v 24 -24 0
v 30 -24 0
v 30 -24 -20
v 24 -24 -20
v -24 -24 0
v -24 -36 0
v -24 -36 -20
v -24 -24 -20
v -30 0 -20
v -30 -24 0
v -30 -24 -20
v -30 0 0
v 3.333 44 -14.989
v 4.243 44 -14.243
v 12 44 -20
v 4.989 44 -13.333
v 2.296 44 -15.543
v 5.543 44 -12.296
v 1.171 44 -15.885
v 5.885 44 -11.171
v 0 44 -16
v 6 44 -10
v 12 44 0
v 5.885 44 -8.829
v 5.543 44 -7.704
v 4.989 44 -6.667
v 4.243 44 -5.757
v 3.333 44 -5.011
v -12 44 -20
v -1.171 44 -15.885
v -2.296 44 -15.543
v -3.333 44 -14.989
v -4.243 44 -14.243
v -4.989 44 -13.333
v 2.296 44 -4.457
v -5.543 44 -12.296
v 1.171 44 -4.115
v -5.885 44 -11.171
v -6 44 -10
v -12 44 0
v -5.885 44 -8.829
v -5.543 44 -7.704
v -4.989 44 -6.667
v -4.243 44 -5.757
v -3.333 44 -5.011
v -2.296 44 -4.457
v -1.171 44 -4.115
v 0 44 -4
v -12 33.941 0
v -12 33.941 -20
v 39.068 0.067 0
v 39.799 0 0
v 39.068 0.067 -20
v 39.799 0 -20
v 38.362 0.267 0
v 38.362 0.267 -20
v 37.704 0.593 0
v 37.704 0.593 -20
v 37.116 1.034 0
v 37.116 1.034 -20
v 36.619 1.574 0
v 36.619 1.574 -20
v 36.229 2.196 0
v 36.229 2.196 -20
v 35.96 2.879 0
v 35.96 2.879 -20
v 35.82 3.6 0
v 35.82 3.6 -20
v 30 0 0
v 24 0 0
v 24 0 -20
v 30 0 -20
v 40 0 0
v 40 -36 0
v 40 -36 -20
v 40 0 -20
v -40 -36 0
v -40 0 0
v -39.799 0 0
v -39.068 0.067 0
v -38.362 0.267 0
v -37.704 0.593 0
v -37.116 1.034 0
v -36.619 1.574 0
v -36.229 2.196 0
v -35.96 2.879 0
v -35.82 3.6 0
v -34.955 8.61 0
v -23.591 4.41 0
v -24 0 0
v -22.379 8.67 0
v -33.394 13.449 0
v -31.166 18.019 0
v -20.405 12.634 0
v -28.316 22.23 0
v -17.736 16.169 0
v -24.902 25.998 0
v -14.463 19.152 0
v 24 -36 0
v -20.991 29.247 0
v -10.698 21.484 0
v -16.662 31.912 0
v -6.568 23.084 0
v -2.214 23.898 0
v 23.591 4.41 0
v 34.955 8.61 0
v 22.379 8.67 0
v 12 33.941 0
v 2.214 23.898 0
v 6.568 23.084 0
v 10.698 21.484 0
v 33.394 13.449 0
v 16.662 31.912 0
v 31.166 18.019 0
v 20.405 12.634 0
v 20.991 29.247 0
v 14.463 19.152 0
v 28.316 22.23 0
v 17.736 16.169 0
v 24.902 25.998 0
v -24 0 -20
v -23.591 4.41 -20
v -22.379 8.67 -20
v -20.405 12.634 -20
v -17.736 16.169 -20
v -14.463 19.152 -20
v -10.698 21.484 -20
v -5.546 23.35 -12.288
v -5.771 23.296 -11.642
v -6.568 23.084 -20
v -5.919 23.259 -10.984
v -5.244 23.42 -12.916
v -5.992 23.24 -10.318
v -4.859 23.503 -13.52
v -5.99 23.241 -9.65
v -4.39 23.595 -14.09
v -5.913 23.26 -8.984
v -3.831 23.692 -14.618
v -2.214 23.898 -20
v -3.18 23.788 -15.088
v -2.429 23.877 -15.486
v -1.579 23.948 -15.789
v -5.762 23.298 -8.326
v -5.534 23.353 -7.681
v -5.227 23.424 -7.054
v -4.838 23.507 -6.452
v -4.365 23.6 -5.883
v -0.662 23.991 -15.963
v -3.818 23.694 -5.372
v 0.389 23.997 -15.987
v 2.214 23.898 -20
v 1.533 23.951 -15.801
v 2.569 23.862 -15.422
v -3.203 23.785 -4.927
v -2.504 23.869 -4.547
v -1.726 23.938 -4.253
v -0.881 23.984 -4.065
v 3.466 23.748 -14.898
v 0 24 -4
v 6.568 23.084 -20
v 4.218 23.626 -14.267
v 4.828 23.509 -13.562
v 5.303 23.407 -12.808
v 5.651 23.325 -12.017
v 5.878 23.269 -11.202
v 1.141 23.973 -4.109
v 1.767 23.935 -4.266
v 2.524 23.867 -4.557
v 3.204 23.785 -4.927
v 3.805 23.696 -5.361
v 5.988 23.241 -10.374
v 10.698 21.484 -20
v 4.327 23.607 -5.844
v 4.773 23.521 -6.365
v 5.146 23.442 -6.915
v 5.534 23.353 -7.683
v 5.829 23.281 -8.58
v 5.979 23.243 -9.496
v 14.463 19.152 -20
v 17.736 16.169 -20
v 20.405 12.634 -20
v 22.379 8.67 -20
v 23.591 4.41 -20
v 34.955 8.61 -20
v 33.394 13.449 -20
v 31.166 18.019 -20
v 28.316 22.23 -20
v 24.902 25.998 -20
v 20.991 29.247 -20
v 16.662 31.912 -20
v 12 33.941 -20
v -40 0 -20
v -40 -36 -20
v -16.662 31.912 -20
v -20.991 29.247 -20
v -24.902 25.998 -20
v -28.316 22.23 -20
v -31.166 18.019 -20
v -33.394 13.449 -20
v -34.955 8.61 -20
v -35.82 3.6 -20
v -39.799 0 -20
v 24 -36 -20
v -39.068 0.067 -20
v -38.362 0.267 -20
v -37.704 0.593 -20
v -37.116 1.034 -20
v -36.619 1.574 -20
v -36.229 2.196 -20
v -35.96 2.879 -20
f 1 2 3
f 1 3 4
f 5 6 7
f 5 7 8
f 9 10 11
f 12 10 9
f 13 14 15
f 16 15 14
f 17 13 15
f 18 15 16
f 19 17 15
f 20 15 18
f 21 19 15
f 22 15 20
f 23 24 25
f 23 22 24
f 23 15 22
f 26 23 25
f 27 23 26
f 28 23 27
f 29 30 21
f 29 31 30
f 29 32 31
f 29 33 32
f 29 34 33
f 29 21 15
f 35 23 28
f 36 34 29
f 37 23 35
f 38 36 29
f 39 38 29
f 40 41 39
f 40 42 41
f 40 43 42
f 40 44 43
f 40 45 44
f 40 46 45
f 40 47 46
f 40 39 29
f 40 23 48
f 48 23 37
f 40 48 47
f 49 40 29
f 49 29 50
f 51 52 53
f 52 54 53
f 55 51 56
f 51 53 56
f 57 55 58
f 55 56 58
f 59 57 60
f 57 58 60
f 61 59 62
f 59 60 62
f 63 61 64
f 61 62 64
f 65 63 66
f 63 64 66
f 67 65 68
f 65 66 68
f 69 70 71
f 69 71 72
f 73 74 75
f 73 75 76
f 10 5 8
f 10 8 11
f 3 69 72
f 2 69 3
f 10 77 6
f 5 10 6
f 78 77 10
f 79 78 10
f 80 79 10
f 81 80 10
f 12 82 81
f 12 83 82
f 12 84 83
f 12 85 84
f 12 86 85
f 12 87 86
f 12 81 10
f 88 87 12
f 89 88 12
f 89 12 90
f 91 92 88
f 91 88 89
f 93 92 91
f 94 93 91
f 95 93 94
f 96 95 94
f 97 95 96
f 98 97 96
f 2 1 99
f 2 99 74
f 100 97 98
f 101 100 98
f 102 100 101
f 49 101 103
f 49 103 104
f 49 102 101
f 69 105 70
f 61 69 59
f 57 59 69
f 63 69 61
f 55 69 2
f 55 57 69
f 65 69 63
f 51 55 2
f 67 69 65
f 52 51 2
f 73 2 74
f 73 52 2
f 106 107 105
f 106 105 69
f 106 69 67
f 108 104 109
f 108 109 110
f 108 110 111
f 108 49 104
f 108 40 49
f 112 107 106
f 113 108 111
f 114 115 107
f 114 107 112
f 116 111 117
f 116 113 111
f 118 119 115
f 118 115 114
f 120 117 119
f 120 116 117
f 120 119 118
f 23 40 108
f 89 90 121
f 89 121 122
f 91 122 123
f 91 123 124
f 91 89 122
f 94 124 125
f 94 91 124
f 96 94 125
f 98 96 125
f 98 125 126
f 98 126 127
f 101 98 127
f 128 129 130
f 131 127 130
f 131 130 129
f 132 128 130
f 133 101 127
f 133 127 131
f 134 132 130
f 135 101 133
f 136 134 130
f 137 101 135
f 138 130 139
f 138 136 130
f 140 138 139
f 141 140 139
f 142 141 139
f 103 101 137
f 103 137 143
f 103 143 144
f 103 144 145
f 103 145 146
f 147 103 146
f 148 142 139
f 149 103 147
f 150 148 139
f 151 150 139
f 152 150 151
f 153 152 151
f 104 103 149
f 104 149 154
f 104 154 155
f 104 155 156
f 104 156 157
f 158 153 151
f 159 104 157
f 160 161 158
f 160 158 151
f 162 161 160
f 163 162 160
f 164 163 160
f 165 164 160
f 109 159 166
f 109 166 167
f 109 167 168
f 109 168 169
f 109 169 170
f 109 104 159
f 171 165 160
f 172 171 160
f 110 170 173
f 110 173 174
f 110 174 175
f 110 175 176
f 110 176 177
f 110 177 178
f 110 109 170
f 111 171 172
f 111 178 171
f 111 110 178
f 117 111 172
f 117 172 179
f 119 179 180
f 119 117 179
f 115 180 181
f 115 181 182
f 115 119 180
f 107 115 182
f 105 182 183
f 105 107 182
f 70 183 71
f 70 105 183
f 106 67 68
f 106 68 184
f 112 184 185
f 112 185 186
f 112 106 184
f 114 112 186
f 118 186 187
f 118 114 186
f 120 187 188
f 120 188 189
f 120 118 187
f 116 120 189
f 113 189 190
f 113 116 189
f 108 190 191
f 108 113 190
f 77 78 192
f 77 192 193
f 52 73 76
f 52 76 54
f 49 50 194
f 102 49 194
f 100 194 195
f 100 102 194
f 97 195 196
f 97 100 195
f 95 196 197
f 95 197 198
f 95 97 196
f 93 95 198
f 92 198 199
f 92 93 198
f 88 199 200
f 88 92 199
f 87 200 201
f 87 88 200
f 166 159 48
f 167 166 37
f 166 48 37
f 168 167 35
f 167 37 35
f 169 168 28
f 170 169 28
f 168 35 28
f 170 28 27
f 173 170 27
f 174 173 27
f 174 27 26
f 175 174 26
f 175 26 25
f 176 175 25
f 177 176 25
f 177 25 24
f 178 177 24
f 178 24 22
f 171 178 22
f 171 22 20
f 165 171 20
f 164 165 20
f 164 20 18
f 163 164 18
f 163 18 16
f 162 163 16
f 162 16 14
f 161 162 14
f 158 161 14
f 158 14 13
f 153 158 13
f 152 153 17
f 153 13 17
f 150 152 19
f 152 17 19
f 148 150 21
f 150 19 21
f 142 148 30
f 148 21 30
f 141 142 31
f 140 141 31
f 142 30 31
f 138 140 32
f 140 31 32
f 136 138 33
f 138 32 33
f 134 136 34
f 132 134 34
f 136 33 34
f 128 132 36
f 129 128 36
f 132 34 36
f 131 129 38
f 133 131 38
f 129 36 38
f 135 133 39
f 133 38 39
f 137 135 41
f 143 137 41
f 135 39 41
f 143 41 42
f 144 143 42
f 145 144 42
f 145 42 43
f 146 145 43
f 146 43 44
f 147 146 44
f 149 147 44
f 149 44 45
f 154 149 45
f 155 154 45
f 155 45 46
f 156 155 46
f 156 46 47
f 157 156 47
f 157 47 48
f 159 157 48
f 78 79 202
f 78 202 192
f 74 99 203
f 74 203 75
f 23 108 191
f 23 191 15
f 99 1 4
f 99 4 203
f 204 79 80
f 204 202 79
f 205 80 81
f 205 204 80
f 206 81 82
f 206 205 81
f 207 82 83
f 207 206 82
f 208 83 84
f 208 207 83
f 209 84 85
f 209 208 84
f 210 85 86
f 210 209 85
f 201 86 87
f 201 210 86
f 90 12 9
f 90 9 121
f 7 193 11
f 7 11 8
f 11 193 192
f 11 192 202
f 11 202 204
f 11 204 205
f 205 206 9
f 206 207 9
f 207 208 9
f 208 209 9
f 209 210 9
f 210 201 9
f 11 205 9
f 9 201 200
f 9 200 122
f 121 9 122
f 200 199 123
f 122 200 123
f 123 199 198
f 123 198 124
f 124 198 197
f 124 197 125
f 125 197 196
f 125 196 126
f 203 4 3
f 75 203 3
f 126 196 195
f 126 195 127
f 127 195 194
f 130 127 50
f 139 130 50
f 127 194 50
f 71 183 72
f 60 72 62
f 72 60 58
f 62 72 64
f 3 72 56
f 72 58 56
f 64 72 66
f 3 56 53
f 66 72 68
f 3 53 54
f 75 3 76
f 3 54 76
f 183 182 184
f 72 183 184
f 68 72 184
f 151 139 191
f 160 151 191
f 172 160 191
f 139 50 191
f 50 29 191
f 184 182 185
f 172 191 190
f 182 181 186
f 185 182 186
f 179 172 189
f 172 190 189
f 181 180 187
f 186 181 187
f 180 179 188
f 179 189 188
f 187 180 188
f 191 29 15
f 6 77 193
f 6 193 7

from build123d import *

# Parameters (mm, degrees)
BOSS_EXTRUDE1_DEPTH = 20
FILLET1_R           = 4
SKETCH3_R           = 6
CUT_EXTRUDE2_DEPTH  = 92.651513899


with BuildPart() as part:
    # Sketch2 → Boss-Extrude1 (new body)
    with BuildSketch(Plane.XY):
        with BuildLine():
            Line((-36, 0), (-40, 0))
            Line((-40, 0), (-40, -36))
            Line((-40, -36), (-24, -36))
            Line((-24, -36), (-24, -24))
            Line((-24, -24), (-30, -24))
            Line((-30, -24), (-30, 0))
            Line((-30, 0), (-24, 0))
            ThreePointArc((-24, 0), (0, 24), (24, 0))
            Line((24, 0), (30, 0))
            Line((30, 0), (30, -24))
            Line((30, -24), (24, -24))
            Line((24, -24), (24, -36))
            Line((24, -36), (40, -36))
            Line((40, -36), (40, 0))
            Line((40, 0), (36, 0))
            ThreePointArc((36, 0), (29.393876913, 20.784609691), (12, 33.941125497))
            Line((12, 33.941125497), (12, 44))
            Line((12, 44), (-12, 44))
            Line((-12, 44), (-12, 33.941125497))
            ThreePointArc((-12, 33.941125497), (-29.393876913, 20.784609691), (-36, 0))
        make_face()
    extrude(amount=-BOSS_EXTRUDE1_DEPTH)

    # Fillet1
    fillet1_edges = [part.edges().sort_by_distance(p)[0] for p in [
        (-36, 0, -10),
        (36, 0, -10),
    ]]
    fillet(fillet1_edges, radius=FILLET1_R)

    # Sketch3 → Cut-Extrude2 (cut, through all)
    with BuildSketch(Plane(origin=(0, 44, 0), x_dir=(1, 0, 0), z_dir=(0, 1, 0))):
        with Locations(Location((0, 10, 0), (0, 0, 270))):
            Circle(SKETCH3_R)
    extrude(amount=-CUT_EXTRUDE2_DEPTH, mode=Mode.SUBTRACT)


solid = part.part
